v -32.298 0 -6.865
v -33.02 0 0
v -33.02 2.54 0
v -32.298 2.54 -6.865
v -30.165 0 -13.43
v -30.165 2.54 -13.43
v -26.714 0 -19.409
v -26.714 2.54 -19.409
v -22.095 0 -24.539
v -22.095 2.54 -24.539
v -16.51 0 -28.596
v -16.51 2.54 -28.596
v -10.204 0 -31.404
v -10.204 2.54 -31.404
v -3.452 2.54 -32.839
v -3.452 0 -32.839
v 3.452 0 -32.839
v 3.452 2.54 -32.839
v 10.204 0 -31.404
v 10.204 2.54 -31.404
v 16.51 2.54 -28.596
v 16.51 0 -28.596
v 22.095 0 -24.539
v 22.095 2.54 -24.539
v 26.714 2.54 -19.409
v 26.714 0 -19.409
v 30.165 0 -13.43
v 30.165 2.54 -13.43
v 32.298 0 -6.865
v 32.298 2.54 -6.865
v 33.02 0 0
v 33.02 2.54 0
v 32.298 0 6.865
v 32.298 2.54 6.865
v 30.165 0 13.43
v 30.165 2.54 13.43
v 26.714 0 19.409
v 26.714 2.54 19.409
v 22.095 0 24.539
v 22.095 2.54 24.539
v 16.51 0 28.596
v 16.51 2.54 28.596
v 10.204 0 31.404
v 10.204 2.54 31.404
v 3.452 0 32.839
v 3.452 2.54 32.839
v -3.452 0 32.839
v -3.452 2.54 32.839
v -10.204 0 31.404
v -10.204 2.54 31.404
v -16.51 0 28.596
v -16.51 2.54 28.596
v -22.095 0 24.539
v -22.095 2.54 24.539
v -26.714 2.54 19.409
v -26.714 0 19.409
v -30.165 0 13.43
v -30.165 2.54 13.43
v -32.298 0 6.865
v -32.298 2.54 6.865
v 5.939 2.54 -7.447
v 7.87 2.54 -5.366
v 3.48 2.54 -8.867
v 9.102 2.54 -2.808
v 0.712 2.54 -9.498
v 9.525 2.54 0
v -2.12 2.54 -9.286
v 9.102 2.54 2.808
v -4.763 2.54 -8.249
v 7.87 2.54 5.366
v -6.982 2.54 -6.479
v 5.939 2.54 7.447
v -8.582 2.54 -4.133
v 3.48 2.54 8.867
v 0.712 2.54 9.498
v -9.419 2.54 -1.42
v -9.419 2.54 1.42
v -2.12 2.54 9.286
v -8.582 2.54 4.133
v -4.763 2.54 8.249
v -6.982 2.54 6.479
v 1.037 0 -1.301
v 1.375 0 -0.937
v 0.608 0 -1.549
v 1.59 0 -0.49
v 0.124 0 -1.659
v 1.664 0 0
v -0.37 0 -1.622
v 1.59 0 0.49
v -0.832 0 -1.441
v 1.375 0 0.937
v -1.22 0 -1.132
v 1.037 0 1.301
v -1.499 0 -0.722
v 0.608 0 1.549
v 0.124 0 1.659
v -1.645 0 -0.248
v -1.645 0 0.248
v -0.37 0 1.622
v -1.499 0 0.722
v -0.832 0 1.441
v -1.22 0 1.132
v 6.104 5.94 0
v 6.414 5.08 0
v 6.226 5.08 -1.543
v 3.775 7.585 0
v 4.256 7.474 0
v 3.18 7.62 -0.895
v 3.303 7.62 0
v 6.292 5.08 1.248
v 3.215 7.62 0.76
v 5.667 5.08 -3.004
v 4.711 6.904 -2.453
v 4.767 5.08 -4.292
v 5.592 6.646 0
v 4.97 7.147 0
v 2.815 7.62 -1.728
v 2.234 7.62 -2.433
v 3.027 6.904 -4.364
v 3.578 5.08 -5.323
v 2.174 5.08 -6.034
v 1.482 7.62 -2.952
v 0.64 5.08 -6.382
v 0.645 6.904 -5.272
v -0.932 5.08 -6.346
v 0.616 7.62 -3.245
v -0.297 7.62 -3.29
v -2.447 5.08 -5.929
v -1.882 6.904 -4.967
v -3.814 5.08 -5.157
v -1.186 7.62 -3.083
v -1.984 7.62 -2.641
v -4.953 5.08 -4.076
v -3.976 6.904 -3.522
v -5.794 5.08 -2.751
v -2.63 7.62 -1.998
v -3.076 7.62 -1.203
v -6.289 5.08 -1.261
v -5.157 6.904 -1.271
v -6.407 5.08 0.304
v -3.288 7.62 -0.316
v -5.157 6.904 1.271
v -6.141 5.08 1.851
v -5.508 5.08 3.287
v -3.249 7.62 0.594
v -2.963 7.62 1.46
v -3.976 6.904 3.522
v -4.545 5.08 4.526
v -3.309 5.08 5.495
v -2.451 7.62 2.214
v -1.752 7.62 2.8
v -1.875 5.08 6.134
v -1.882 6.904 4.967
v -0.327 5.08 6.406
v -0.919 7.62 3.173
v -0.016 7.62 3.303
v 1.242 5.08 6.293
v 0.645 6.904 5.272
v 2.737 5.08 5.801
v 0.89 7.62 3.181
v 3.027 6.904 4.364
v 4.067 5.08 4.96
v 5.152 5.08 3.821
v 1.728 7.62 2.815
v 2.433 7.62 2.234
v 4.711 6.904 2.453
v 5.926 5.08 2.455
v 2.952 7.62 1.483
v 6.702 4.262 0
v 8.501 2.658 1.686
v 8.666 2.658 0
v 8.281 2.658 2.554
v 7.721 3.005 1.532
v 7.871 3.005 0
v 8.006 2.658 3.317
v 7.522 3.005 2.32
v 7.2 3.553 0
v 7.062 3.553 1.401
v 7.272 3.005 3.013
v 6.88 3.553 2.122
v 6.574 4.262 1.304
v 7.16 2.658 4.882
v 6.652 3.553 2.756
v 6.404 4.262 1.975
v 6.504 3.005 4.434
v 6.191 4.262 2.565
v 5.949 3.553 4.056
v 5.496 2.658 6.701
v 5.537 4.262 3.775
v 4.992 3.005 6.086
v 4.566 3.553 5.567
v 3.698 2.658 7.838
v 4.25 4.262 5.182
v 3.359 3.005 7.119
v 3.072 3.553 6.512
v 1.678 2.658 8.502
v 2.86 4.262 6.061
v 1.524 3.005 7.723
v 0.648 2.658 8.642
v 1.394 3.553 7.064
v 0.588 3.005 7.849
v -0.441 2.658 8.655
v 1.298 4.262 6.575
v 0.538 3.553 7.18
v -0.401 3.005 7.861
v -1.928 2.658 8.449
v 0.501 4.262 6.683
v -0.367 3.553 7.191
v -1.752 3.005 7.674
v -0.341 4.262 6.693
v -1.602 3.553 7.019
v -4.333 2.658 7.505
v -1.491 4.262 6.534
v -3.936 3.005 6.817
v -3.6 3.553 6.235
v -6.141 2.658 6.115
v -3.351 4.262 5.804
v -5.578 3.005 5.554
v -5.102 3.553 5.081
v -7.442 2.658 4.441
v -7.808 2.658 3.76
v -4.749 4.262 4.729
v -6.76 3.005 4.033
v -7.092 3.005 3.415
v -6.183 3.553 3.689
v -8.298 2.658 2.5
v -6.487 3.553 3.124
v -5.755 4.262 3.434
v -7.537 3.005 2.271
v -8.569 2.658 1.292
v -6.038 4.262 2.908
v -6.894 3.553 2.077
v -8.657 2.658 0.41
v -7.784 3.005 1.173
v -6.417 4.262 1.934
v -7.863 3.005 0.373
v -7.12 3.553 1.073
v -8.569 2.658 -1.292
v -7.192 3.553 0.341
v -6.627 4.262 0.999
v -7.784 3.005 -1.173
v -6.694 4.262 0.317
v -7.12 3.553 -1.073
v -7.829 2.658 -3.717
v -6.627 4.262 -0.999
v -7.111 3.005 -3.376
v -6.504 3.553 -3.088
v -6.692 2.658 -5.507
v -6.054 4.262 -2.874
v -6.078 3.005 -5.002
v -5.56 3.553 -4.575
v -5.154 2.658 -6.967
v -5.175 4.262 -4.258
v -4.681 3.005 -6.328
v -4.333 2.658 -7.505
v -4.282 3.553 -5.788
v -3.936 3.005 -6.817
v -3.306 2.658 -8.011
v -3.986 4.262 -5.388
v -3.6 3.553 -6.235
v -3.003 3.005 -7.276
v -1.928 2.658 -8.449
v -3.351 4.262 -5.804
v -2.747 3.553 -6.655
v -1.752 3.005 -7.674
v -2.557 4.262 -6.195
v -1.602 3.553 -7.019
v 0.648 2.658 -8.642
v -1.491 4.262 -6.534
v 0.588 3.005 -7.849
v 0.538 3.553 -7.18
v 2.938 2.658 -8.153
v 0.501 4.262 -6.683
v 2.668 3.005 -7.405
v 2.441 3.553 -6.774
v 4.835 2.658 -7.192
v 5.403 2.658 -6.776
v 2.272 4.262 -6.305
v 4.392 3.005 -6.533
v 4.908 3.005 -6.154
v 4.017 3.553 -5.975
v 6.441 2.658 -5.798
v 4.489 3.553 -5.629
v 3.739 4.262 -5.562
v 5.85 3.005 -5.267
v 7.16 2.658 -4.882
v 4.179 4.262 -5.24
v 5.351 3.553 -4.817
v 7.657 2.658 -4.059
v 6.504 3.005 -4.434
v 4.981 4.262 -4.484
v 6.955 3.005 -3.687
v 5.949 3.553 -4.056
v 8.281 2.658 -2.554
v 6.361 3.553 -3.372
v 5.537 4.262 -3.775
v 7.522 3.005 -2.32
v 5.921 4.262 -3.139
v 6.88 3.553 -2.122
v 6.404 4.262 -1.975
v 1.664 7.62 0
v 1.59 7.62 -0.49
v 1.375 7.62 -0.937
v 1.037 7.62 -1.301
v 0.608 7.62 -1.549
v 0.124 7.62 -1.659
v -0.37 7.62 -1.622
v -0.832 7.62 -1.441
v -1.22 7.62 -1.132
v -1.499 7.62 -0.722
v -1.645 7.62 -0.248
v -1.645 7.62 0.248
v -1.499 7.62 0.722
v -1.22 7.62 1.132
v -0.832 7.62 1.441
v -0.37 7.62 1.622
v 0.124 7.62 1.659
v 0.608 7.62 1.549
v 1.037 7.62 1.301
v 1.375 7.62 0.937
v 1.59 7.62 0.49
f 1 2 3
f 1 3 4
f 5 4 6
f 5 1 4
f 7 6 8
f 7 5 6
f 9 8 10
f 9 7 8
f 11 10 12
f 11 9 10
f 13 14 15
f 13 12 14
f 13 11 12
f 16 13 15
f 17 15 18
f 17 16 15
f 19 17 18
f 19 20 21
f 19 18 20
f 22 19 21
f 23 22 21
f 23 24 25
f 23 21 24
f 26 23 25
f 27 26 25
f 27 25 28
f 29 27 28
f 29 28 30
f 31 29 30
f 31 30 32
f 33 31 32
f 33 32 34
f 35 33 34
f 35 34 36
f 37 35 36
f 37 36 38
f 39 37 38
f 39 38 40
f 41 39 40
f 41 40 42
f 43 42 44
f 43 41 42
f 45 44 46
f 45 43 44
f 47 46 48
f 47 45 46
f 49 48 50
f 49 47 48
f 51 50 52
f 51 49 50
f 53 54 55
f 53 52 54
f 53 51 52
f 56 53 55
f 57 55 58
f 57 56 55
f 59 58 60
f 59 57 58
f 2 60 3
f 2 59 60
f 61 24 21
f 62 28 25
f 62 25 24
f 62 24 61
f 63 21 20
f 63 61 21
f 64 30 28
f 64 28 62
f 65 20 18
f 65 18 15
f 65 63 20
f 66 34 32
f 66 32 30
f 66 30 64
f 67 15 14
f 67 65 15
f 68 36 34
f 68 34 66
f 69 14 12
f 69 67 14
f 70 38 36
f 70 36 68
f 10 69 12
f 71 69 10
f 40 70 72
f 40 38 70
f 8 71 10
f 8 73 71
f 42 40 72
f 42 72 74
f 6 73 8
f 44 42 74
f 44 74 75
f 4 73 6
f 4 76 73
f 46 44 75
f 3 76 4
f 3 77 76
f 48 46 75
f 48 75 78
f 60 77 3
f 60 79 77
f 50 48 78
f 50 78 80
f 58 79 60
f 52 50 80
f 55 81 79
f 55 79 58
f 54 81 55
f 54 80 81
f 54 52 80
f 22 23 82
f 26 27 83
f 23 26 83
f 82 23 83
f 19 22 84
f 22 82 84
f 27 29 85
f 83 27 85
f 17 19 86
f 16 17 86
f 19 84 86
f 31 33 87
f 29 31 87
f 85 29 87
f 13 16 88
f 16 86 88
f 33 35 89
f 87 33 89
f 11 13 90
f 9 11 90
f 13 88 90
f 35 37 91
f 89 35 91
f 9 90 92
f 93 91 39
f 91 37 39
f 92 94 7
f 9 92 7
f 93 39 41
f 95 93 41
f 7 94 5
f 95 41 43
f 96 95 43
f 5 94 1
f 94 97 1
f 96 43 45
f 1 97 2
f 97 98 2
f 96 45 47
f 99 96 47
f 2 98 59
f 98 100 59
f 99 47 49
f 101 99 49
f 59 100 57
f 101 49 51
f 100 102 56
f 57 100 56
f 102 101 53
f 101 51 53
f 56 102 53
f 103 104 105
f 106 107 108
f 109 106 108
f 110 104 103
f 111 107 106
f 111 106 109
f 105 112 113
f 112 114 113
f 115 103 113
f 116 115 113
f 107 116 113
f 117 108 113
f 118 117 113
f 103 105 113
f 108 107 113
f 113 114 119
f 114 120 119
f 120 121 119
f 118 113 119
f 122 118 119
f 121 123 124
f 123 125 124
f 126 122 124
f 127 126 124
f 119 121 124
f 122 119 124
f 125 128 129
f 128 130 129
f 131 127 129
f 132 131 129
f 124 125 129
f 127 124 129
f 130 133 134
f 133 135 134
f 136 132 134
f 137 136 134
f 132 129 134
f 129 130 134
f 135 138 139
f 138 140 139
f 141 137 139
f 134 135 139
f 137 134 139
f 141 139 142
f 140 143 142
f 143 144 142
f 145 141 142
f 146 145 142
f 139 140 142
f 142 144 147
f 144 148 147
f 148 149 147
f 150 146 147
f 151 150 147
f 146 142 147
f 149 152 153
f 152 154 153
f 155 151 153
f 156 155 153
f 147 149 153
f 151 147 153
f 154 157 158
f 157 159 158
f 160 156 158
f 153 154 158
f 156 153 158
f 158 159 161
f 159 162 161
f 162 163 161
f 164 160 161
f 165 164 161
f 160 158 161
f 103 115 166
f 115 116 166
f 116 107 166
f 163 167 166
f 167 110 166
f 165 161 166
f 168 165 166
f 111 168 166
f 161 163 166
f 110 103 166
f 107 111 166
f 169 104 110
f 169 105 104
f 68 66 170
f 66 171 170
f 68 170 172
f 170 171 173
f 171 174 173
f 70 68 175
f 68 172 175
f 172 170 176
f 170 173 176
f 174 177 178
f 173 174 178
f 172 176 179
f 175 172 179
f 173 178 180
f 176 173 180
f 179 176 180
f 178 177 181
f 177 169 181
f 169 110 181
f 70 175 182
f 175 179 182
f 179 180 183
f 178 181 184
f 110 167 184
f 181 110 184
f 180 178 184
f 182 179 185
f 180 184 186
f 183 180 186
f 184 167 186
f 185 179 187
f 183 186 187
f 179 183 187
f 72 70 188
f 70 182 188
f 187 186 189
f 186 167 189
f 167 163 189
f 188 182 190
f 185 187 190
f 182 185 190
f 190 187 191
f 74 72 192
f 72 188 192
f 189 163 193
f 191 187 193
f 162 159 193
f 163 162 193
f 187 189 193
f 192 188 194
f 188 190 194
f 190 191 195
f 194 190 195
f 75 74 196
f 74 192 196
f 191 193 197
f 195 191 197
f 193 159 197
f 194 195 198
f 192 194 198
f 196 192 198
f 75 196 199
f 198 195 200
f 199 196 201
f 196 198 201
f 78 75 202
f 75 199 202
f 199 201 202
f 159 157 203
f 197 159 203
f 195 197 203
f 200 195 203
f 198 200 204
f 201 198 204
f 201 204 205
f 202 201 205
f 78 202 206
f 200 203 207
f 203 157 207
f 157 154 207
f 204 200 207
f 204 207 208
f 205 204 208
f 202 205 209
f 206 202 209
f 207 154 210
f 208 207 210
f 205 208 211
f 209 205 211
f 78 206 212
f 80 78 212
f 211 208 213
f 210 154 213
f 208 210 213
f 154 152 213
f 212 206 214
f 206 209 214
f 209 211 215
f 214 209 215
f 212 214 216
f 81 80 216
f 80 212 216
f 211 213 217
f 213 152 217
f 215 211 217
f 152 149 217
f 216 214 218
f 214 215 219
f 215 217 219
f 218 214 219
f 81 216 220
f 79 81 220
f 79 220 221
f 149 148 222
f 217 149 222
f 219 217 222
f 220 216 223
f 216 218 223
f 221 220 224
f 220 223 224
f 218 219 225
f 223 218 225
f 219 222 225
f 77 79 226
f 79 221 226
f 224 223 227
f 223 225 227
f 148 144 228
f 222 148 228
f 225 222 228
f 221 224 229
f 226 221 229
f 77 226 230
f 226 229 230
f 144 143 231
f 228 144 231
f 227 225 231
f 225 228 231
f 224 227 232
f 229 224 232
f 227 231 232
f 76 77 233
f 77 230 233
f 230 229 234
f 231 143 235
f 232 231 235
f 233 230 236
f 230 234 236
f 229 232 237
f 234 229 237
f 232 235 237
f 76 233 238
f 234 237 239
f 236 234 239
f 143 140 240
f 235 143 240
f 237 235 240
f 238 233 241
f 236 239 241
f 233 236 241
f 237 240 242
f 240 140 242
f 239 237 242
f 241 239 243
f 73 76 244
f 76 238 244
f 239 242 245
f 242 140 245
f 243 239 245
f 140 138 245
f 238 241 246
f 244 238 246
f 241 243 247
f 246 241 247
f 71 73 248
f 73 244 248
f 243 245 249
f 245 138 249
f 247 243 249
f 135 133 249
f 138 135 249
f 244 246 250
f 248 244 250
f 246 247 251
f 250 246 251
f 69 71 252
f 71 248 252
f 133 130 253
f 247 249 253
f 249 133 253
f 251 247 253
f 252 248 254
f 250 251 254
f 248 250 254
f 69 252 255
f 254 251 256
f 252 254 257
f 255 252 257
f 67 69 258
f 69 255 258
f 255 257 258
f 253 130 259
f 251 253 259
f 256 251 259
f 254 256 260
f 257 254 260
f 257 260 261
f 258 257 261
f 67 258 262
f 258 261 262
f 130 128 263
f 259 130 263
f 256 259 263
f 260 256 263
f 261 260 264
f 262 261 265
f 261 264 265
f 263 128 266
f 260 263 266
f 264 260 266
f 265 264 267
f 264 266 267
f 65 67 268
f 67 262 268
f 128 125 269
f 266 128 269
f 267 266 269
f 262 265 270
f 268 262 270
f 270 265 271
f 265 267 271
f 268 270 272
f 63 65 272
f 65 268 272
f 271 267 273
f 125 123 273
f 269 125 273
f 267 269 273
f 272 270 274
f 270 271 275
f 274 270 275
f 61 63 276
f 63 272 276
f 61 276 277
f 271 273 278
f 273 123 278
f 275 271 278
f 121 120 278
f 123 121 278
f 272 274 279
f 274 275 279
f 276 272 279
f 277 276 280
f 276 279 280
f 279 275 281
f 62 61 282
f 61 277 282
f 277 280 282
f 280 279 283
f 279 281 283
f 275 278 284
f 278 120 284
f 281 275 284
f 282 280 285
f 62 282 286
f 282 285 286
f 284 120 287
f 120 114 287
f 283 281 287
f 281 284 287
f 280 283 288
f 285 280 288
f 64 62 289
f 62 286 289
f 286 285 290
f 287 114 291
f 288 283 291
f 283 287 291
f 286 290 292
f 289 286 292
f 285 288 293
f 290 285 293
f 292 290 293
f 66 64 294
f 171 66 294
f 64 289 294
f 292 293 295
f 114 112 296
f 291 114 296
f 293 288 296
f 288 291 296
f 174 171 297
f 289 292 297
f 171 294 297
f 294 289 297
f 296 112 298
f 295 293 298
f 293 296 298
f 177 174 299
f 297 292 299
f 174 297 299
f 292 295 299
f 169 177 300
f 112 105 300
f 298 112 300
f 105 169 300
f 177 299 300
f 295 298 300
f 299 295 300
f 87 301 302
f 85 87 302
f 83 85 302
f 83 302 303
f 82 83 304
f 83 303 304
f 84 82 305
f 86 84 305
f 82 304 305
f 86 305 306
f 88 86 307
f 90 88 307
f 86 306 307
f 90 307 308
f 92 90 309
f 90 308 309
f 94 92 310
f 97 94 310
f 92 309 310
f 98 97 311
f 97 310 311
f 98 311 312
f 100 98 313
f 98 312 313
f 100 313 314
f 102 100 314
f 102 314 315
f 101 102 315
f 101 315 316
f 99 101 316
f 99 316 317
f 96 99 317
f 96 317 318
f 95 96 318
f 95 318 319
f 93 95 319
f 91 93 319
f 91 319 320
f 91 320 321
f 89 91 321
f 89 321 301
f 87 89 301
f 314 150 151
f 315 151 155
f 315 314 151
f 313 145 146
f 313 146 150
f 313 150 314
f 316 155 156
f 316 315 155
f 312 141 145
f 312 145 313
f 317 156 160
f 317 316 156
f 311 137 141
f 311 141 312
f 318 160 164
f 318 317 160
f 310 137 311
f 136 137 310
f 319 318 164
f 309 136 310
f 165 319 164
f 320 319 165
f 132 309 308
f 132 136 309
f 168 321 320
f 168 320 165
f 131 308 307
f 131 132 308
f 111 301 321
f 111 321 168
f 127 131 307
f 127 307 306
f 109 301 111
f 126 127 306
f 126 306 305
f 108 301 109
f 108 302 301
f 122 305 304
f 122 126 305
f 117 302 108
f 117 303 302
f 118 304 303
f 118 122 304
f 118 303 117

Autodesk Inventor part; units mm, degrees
ref_plane "YZ Plane" through (0, 0, 0) normal (1, 0, 0) x (0, 1, 0)
ref_plane "XZ Plane" through (0, 0, 0) normal (0, 1, 0) x (-1, 0, 0)
ref_plane "XY Plane" through (0, 0, 0) normal (0, 0, 1) x (1, 0, 0)
sketch "Sketch1" plane through (0, 0, 0) normal (0, 1, 0) x (-1, 0, 0)
  circle A0 centre (0, 0) radius 33.02
  dimension "d0" = 66.04
extrude "Extrusion1" add sketch "Sketch1" along normal blind 2.54
sketch "Sketch2" plane through (0, 2.54, 0) normal (0, 1, 0) x (1, 0, 0)
  circle A0 centre (0, 0) radius 6.35
  dimension "d4" = 12.7
extrude "Extrusion2" add sketch "Sketch2" along normal blind 5.08
fillet "Fillet1" radius 3.175 1 edges at (-6.35, 2.54, 0)
sketch "Sketch3" plane through (0, 7.62, 0) normal (0, 1, 0) x (1, 0, 0)
  circle A0 centre (0, 0) radius 1.6637
  dimension "d8" = 3.3274
extrude "Extrusion3" cut sketch "Sketch3" against normal blind 7.62
fillet "Fillet2" radius 3.175 1 edges at (-6.35, 7.62, 0)
sketch "Sketch4" plane through (0, 0, 0) normal (0, -1, 0) x (1, 0, 0)
  point P0 (0, 0)
sketch "Sketch7" plane through (0, 0, 0) normal (0, -1, 0) x (1, 0, 0)
  circle A0 centre (0, 0) radius 33.02 projected
  arc A1 (32.1408, -7.5691) -> (33.02, 0) centre (0, 0) ccw
  arc A2 (33.02, 0) -> (32.1572, 7.4991) centre (0, 0) ccw
  circle A3 centre (0, 0) radius 1.6637 projected
  line L0 (0, 0) -> (32.6627, -4.8446)
  line L1 (0, 0) -> (32.4709, 5.9969)
  arc A4 (32.6627, -4.8446) -> (32.4709, 5.9969) centre (0, 0) ccw
  line L2 (26.162, -3.8804) -> (26.162, 4.8318)
  arc A5 (32.6627, -4.8446) -> (32.4709, 5.9969) centre (0, 0) ccw
  arc A6 (26.5217, 19.6703) -> (18.7199, 27.2008) centre (0, 0) ccw
  line L3 (0, 0) -> (26.5217, 19.6703)
  line L4 (21.2432, 15.7555) -> (15.0827, 21.9159)
  line L5 (0, 0) -> (18.7199, 27.2008)
  arc A7 (4.8446, 32.6627) -> (-5.9969, 32.4709) centre (0, 0) ccw
  line L6 (0, 0) -> (4.8446, 32.6627)
  line L7 (3.8804, 26.162) -> (-4.8318, 26.162)
  line L8 (0, 0) -> (-5.9969, 32.4709)
  arc A8 (-19.6703, 26.5217) -> (-27.2008, 18.7199) centre (0, 0) ccw
  line L9 (0, 0) -> (-19.6703, 26.5217)
  line L10 (-15.7555, 21.2432) -> (-21.9159, 15.0827)
  line L11 (0, 0) -> (-27.2008, 18.7199)
  arc A9 (-32.6627, 4.8446) -> (-32.4709, -5.9969) centre (0, 0) ccw
  line L12 (0, 0) -> (-32.6627, 4.8446)
  line L13 (-26.162, 3.8804) -> (-26.162, -4.8318)
  line L14 (0, 0) -> (-32.4709, -5.9969)
  arc A10 (-26.5217, -19.6703) -> (-18.7199, -27.2008) centre (0, 0) ccw
  line L15 (0, 0) -> (-26.5217, -19.6703)
  line L16 (-21.2432, -15.7555) -> (-15.0827, -21.9159)
  line L17 (0, 0) -> (-18.7199, -27.2008)
  arc A11 (-4.8446, -32.6627) -> (5.9969, -32.4709) centre (0, 0) ccw
  line L18 (0, 0) -> (-4.8446, -32.6627)
  line L19 (-3.8804, -26.162) -> (4.8318, -26.162)
  line L20 (0, 0) -> (5.9969, -32.4709)
  arc A12 (19.6703, -26.5217) -> (27.2008, -18.7199) centre (0, 0) ccw
  line L21 (0, 0) -> (19.6703, -26.5217)
  line L22 (15.7555, -21.2432) -> (21.9159, -15.0827)
  line L23 (0, 0) -> (27.2008, -18.7199)
  point P0 (23.3487, 23.3487)
  point P1 (0, 33.02)
  point P2 (-23.3487, 23.3487)
  point P3 (-33.02, 0)
  point P4 (-23.3487, -23.3487)
  point P5 (0, -33.02)
  point P6 (23.3487, -23.3487)
  dimension "d25" = 26.162
  dimension "d26" = 8.7122
  dimension "d29" = 360
properties part number "small encoder wheel noah 1"
